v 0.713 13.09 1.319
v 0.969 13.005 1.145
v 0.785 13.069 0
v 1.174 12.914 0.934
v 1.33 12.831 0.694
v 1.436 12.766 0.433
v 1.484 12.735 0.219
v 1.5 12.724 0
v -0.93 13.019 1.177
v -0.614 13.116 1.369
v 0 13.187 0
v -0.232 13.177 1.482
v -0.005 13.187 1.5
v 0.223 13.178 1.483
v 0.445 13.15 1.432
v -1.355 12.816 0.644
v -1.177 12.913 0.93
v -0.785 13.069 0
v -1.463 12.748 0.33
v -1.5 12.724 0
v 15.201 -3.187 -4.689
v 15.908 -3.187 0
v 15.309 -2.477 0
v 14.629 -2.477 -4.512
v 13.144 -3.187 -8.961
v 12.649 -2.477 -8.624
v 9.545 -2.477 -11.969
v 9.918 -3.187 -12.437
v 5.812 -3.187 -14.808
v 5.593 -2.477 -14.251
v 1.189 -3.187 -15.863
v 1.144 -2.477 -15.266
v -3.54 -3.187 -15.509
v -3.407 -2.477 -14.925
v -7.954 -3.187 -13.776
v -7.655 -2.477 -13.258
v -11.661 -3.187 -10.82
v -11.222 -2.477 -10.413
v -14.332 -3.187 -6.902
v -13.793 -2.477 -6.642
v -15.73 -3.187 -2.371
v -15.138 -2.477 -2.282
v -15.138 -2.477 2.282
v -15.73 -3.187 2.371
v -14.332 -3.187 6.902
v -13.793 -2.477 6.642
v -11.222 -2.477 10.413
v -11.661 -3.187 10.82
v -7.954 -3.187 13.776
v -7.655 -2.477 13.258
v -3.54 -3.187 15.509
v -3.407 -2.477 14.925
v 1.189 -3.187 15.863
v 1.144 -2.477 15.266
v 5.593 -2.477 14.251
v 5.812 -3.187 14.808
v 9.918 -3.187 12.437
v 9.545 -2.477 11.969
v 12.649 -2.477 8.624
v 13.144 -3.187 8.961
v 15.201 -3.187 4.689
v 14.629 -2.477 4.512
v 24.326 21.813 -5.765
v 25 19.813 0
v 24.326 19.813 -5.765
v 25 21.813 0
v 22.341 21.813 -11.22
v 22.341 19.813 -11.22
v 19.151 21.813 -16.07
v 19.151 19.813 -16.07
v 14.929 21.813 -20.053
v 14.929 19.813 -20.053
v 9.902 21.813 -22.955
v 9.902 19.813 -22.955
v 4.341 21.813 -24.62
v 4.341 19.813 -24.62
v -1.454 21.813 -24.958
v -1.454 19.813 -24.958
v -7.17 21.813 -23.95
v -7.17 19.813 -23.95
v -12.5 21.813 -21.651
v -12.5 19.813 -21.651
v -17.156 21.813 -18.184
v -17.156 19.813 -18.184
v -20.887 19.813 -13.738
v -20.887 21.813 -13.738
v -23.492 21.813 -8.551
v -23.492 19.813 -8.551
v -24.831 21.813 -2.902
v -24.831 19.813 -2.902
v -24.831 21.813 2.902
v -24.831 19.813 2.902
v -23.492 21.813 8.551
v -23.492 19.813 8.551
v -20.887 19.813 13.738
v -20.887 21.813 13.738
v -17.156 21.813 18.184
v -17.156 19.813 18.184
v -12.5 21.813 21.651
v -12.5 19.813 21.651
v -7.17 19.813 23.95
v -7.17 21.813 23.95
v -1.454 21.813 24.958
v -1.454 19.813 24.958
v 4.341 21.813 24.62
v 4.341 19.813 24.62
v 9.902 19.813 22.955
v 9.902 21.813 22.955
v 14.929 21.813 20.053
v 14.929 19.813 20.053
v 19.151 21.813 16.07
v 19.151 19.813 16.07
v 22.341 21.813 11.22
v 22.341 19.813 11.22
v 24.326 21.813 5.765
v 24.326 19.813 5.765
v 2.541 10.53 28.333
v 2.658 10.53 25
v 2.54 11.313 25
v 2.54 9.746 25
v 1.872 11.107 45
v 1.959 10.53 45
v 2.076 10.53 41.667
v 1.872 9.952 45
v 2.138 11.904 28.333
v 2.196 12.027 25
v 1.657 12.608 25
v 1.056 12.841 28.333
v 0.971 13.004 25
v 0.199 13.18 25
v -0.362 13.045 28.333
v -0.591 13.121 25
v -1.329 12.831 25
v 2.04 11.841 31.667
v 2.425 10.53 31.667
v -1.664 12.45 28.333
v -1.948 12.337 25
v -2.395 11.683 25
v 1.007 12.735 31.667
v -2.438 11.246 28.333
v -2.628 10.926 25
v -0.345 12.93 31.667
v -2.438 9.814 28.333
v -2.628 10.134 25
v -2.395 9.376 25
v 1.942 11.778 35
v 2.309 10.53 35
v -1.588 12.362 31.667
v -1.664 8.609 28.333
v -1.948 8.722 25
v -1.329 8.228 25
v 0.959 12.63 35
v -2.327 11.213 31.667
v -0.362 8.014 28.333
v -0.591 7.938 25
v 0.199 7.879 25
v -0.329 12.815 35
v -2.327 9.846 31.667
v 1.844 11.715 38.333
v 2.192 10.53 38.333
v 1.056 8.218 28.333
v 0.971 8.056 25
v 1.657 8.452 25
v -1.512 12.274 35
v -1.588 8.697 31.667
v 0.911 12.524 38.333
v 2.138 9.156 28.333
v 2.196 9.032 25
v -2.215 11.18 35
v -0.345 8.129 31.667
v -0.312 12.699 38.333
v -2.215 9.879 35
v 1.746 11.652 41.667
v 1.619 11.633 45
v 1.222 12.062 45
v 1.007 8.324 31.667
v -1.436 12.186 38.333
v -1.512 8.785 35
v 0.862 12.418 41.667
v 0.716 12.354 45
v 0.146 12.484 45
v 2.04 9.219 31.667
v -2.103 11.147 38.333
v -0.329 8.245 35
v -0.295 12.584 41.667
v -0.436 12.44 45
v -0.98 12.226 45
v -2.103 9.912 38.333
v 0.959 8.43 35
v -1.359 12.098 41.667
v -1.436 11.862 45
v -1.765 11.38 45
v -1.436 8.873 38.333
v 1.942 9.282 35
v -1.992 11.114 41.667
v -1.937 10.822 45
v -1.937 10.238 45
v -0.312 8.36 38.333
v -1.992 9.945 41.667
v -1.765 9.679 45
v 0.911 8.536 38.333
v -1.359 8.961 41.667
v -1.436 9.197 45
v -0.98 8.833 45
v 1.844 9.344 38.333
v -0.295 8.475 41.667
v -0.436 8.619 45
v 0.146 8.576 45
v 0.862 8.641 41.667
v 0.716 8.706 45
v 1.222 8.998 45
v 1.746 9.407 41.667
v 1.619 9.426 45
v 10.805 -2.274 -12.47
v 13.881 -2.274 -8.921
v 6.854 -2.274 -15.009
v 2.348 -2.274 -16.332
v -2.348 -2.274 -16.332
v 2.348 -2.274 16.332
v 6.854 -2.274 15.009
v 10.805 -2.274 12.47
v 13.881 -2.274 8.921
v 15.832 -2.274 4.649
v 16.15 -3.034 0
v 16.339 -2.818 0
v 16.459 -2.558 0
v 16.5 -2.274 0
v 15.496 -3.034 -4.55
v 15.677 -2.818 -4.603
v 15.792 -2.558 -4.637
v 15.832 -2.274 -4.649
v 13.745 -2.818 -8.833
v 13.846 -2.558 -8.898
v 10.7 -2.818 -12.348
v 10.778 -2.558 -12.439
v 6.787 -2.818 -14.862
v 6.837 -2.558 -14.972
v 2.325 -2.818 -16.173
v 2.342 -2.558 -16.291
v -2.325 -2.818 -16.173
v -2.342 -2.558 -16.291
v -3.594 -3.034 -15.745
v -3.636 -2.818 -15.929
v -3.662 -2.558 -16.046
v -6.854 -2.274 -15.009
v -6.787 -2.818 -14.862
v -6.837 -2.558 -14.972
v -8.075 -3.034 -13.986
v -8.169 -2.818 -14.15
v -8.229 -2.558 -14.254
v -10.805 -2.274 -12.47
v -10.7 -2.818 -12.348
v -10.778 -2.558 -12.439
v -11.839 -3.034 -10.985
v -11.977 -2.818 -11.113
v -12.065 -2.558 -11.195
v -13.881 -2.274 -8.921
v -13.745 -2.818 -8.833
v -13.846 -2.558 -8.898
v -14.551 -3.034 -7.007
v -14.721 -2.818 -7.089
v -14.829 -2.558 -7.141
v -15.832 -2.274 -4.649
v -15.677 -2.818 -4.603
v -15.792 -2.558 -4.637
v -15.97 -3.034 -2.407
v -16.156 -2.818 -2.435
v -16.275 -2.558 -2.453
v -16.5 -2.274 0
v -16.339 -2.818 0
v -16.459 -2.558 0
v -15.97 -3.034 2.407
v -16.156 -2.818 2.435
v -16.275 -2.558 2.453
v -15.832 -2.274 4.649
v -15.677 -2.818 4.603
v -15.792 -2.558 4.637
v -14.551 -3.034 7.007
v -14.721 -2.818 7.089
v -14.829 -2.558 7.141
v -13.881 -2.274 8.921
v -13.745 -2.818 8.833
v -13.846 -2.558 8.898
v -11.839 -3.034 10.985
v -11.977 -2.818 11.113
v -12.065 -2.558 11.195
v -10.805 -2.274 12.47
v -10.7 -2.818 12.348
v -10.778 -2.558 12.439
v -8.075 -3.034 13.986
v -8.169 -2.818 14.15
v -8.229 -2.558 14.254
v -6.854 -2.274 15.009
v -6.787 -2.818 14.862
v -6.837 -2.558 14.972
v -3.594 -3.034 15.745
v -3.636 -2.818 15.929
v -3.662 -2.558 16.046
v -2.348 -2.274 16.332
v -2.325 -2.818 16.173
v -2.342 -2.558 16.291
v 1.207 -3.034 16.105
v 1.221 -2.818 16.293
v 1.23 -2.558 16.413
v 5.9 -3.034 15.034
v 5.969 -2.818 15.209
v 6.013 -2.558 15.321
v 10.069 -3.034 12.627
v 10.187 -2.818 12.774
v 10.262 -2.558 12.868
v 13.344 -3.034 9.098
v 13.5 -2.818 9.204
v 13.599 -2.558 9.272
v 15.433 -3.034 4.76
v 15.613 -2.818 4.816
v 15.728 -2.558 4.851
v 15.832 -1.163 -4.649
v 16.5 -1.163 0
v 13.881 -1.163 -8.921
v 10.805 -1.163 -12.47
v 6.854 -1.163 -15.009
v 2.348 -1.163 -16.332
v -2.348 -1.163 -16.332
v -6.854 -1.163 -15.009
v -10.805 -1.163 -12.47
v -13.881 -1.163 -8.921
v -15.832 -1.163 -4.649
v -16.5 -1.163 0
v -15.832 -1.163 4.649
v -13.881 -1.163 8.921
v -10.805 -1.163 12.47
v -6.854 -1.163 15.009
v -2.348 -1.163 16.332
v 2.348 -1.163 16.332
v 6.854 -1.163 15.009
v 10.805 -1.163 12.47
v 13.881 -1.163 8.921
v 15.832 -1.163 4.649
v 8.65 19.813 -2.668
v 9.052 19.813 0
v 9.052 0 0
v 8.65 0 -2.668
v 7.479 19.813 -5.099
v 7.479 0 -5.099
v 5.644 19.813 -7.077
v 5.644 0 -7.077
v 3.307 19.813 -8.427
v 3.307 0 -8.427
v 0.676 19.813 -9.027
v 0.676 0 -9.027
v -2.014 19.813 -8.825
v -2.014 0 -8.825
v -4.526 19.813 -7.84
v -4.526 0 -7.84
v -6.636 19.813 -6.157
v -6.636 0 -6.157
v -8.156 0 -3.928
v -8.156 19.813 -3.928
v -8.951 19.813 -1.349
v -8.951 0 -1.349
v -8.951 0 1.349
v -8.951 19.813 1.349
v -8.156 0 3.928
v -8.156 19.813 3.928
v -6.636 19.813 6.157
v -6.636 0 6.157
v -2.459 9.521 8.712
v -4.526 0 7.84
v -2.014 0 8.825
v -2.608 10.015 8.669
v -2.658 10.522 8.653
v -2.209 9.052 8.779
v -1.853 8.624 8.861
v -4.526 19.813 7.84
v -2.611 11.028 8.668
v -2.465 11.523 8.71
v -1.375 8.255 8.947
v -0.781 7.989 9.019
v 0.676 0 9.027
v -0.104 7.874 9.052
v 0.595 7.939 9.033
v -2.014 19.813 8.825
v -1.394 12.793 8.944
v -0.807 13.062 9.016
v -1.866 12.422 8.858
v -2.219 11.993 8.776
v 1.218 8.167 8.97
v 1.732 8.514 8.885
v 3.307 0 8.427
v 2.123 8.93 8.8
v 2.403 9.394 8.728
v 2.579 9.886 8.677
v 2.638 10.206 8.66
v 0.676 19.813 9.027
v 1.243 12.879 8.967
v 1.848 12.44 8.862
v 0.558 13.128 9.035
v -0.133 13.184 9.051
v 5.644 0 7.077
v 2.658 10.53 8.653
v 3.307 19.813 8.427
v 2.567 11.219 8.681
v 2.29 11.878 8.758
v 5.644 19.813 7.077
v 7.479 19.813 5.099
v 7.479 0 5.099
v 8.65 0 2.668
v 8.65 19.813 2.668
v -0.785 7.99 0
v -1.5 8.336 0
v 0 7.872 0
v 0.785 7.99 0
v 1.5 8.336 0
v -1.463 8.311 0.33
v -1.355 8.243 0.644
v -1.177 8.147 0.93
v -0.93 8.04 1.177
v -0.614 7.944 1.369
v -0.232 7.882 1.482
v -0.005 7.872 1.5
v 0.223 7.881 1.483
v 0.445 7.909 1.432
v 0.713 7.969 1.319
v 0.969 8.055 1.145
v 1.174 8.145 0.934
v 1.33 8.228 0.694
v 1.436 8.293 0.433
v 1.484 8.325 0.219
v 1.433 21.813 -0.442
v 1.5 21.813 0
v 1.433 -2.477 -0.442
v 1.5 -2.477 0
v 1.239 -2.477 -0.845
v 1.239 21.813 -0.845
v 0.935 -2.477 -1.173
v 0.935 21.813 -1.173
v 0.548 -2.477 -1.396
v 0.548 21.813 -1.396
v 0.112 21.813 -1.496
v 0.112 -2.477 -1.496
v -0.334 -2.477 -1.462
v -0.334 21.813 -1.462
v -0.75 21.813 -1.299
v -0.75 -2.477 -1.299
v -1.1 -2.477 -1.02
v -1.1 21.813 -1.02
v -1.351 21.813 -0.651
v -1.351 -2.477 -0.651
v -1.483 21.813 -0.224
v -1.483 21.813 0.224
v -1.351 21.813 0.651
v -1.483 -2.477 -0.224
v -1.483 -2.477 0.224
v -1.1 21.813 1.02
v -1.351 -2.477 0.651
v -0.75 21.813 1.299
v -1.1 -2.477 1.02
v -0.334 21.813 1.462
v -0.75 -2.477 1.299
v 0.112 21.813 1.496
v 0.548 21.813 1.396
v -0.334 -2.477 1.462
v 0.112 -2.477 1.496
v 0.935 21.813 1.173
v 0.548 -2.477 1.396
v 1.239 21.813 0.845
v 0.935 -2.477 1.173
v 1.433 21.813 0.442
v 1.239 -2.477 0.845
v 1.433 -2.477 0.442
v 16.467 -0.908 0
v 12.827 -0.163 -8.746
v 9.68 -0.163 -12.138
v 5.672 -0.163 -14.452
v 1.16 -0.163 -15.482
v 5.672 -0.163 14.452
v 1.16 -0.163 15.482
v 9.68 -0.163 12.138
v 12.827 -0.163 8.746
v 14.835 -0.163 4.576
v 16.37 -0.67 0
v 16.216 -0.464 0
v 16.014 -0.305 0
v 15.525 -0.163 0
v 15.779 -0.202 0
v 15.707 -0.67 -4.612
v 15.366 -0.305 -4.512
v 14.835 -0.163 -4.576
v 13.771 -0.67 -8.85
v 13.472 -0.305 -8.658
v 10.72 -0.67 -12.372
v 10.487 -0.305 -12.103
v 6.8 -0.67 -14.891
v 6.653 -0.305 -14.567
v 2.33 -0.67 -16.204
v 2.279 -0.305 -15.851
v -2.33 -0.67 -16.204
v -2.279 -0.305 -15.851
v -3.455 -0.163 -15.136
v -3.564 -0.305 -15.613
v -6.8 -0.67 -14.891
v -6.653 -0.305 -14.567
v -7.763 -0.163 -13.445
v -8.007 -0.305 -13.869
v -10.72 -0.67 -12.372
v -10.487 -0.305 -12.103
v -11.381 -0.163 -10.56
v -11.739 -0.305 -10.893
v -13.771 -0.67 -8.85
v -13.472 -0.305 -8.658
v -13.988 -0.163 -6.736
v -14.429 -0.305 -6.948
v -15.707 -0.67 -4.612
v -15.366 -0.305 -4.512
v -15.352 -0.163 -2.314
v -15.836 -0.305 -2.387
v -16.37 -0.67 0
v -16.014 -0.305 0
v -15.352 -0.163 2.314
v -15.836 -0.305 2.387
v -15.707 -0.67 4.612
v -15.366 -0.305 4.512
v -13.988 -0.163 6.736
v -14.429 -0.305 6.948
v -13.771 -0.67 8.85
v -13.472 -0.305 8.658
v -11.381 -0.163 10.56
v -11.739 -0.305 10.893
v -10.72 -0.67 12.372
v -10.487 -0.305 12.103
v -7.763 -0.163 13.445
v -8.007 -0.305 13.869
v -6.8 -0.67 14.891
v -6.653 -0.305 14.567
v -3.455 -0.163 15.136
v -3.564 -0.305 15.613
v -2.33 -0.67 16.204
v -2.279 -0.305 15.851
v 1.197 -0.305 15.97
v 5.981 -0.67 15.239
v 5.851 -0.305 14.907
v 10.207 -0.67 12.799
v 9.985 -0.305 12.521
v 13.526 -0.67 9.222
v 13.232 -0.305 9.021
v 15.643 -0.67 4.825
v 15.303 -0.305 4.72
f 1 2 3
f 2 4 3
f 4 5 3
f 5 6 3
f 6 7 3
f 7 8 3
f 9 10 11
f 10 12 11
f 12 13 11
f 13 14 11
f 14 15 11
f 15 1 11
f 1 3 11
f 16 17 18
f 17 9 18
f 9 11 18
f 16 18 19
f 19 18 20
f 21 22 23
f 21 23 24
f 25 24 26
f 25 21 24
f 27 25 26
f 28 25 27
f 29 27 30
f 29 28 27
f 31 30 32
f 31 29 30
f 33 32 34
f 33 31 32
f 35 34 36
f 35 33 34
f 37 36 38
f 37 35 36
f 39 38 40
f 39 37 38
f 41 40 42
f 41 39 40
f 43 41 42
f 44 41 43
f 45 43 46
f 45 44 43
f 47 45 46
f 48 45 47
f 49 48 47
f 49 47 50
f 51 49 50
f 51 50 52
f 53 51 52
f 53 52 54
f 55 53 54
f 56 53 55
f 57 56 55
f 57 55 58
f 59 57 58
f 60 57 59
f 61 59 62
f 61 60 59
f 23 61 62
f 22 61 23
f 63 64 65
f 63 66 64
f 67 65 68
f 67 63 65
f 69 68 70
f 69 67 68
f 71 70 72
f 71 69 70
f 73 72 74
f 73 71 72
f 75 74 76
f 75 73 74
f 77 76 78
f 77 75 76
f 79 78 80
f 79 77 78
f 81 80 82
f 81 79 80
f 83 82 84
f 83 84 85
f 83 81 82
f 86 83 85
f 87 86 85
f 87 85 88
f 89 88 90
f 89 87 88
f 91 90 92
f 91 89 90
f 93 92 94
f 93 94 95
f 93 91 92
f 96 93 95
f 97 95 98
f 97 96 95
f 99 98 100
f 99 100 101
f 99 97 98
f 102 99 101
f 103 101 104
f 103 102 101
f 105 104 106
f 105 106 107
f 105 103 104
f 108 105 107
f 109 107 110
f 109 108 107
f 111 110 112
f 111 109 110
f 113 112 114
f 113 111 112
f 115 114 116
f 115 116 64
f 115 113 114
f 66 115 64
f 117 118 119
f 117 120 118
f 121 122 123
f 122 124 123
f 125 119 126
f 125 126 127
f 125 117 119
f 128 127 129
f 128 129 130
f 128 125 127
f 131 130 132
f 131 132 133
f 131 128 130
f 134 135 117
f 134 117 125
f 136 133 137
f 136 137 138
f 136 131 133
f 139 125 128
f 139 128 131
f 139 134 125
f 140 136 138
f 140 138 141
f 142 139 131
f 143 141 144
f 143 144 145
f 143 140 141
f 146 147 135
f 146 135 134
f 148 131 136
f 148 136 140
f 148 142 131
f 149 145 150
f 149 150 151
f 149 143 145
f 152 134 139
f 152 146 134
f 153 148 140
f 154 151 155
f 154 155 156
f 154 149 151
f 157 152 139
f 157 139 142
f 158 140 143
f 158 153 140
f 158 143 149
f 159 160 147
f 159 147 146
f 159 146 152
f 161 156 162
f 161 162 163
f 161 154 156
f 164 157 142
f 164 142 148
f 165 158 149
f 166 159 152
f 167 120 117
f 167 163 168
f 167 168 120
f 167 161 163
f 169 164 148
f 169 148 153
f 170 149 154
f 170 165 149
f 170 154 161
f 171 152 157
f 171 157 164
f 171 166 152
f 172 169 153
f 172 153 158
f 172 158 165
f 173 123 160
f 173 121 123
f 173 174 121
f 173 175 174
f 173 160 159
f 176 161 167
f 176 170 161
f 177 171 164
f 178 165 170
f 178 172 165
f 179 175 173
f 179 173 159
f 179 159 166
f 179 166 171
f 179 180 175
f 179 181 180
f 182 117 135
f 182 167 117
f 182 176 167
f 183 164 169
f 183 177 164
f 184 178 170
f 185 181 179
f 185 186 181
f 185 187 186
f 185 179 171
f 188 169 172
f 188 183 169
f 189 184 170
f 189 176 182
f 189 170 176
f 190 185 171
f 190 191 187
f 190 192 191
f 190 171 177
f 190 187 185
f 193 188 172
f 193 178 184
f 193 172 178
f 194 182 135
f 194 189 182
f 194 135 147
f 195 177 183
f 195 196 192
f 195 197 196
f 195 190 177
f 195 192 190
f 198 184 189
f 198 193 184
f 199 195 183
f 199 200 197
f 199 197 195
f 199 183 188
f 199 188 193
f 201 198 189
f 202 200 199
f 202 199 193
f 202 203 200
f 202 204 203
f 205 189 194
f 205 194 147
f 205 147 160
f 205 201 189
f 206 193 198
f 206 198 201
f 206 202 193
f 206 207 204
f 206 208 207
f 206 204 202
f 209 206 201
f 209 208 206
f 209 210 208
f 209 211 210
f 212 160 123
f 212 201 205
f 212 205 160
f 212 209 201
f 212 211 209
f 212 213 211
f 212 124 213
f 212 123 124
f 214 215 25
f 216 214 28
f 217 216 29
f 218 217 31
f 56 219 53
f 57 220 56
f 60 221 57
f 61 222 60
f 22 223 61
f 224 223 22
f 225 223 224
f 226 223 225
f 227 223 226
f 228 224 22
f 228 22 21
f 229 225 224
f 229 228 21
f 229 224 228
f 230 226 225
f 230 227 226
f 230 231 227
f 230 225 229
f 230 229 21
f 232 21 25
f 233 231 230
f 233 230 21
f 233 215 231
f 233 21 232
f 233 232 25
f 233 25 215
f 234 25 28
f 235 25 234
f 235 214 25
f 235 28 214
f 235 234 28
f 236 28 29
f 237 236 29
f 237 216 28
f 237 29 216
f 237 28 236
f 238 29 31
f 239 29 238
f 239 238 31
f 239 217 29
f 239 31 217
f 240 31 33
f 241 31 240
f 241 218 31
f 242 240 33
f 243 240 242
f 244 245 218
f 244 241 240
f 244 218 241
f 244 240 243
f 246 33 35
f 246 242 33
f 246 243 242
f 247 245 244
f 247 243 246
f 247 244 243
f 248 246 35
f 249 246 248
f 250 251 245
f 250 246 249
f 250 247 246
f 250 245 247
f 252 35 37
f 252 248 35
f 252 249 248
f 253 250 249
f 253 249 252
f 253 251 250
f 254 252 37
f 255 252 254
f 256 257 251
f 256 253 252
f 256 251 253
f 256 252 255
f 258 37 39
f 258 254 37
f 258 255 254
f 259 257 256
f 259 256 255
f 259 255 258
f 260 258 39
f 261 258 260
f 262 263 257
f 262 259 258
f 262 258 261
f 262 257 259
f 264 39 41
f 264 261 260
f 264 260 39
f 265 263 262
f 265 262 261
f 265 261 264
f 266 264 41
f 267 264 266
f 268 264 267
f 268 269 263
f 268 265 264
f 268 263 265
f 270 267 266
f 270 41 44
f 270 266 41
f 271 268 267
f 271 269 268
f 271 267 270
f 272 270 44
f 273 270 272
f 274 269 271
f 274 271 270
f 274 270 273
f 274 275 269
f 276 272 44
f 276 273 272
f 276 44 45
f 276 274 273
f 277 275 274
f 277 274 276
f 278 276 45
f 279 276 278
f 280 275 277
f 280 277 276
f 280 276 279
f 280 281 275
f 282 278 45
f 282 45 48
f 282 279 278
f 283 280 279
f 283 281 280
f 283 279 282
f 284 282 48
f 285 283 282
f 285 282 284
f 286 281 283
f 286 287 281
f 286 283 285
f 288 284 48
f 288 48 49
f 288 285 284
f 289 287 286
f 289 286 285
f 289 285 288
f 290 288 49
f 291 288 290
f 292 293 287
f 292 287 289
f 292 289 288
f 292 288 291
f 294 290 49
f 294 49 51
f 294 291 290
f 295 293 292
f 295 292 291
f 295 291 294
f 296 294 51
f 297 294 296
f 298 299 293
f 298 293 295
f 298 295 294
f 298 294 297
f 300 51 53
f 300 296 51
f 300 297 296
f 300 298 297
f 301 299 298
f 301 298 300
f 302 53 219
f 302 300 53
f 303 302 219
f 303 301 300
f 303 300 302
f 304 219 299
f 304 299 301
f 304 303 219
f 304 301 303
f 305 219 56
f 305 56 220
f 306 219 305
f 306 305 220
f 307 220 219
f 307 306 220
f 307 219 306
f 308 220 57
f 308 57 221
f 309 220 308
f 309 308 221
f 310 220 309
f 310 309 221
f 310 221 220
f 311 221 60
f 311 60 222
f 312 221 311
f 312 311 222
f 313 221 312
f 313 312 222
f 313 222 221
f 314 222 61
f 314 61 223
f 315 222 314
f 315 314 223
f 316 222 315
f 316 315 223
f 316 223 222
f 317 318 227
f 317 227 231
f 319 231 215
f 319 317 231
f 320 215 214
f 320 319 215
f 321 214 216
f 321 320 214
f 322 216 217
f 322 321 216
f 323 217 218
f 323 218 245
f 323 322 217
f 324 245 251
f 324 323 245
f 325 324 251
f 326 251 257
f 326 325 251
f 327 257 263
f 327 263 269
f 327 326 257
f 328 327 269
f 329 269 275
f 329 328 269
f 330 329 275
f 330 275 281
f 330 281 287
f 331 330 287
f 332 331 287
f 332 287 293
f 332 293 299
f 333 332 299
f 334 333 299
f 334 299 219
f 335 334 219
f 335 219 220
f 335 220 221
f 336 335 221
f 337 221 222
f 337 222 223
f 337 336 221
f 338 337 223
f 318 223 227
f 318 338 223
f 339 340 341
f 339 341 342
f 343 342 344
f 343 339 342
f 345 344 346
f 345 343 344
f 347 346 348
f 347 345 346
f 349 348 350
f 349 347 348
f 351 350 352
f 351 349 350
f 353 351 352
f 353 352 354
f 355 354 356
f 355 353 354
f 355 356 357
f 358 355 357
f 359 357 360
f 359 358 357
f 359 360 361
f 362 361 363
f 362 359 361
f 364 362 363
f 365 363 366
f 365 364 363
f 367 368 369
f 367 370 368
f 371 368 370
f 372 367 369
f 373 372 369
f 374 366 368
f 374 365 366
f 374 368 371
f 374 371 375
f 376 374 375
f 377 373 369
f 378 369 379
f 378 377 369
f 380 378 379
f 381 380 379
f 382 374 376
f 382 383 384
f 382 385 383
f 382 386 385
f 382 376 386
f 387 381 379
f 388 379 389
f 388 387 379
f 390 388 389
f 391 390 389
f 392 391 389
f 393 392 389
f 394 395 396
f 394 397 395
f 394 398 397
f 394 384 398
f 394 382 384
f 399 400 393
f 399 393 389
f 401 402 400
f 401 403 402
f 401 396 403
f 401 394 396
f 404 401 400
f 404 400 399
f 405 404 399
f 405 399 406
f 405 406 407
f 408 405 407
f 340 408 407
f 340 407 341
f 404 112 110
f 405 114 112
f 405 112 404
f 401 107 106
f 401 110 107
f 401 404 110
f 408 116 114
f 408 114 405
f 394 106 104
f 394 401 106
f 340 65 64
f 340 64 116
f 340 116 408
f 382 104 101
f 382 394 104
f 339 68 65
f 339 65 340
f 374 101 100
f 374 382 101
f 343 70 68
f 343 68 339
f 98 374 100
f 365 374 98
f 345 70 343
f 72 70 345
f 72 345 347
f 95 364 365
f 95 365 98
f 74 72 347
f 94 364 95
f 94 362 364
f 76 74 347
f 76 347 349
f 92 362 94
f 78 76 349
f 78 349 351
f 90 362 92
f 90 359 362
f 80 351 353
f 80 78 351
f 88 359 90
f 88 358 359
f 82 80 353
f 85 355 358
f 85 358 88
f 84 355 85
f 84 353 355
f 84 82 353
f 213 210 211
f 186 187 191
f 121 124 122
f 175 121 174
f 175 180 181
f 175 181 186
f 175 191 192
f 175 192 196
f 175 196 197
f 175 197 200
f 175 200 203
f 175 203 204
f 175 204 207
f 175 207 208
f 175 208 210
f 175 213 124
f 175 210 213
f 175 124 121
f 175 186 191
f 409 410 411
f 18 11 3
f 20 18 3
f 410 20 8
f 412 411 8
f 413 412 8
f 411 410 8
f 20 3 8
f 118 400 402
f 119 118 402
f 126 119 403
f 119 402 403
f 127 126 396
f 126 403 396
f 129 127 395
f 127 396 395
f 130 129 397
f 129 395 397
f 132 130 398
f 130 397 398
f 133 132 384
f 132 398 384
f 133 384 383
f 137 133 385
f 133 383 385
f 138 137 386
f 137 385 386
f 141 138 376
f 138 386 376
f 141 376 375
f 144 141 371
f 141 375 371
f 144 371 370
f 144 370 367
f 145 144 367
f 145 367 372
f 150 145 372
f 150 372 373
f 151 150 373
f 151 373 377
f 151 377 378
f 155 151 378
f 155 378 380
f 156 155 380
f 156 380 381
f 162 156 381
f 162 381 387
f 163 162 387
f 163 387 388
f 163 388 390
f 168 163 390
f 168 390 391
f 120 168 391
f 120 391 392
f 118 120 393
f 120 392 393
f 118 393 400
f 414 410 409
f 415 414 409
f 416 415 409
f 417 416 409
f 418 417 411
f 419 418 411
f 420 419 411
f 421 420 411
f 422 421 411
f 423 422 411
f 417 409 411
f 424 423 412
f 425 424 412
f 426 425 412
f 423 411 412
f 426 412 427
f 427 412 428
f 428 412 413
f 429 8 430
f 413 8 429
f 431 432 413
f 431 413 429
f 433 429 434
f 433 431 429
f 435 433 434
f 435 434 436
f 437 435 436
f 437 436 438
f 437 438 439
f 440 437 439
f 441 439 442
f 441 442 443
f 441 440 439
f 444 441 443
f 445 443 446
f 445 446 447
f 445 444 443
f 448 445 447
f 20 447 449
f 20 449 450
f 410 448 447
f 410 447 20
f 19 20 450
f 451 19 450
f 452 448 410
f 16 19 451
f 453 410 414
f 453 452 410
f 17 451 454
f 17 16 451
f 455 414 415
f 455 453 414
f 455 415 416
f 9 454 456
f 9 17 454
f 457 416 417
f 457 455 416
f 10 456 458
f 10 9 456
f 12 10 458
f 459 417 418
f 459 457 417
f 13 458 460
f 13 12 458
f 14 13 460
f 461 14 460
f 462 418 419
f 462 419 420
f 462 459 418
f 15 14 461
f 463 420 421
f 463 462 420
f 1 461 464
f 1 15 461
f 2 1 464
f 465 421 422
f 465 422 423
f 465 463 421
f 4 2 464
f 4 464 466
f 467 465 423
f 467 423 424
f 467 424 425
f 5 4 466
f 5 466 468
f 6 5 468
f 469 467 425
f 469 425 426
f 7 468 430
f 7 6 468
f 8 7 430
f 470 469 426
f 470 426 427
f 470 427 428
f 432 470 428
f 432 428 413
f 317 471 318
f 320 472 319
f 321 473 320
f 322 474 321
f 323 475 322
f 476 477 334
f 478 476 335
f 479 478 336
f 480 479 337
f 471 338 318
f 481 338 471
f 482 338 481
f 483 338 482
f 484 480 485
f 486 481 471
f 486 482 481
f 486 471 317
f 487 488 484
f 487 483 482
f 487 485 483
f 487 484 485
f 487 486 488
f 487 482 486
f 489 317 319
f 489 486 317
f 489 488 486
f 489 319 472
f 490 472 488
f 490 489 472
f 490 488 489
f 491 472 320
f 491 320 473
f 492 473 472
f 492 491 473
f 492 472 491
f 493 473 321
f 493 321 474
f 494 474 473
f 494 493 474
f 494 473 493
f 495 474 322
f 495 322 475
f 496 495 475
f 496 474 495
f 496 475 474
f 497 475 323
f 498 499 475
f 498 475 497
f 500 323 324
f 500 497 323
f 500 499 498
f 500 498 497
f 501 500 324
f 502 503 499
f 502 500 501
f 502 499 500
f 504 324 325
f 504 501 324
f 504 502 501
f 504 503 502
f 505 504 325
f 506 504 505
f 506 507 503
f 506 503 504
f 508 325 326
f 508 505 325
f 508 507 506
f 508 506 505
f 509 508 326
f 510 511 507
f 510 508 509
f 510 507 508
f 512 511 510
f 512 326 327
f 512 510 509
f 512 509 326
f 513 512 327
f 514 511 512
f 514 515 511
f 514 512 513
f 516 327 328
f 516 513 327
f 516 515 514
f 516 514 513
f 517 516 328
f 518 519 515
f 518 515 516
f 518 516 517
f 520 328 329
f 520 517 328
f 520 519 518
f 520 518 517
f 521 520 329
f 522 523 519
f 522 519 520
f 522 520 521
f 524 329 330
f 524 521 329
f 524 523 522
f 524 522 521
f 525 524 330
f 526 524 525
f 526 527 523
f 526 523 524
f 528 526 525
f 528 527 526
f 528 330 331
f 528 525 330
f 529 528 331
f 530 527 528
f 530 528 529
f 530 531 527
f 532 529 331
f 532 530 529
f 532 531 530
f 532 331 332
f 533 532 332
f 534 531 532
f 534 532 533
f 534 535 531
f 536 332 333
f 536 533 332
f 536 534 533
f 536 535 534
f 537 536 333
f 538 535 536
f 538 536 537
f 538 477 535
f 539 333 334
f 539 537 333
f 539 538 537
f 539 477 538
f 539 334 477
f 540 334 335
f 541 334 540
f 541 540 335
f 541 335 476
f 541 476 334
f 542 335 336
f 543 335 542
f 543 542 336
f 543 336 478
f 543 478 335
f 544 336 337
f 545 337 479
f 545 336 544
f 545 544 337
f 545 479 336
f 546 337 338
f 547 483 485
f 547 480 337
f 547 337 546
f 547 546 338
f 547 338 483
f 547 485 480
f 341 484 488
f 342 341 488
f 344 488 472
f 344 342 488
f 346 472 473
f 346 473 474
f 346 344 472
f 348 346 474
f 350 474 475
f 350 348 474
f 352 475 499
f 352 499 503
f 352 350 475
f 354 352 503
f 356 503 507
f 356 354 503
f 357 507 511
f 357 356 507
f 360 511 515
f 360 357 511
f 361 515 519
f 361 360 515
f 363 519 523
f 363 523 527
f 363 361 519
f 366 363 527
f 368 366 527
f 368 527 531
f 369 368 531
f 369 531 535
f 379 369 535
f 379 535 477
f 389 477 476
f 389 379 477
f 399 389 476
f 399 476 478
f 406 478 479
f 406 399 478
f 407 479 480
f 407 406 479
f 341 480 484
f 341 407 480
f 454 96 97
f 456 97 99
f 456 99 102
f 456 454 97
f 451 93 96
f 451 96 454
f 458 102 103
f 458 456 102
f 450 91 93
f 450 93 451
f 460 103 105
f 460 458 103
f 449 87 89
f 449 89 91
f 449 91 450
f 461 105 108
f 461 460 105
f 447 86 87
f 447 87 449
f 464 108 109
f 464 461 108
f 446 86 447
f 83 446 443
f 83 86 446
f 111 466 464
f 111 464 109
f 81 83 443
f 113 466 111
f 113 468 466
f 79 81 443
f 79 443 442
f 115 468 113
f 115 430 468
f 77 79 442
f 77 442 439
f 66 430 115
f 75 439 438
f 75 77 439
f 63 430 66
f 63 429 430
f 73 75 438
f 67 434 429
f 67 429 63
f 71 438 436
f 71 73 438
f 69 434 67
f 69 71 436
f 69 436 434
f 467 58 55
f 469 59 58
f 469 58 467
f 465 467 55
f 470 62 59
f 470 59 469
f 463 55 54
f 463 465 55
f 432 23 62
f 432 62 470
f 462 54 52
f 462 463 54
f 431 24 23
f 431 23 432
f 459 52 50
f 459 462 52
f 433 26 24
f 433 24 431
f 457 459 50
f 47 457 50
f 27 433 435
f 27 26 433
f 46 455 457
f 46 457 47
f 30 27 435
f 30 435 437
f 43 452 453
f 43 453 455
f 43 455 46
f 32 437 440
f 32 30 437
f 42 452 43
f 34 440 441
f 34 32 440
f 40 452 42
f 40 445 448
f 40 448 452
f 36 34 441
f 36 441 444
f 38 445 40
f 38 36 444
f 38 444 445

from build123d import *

# Parameters (mm, degrees)
F3_R     = 2.6577794355
F4_DEPTH = 45
F5_SIZE2 = 0.6984153898
F5_SIZE  = 20


# Not quite as in the source:
# - a fillet or chamfer that OpenCascade refuses, or shapes differently, is made with other operations: its cross-section is extruded or revolved along the edge and cut away or added


with BuildPart() as f1:
    # F0 (on Top) → F1 (revolve)
    with BuildSketch(Plane.XY):
        Polygon((25, 21.8126288628), (1.5, 21.8126288628), (1.5, -2.4768179283), (15.309067443, -2.4768179283), (15.9076526761, -3.1873711372), (16.5, -3.1873711372), (16.5, -0.1873711372), (9.0524229015, 0), (9.0524229015, 19.8126288628), (25, 19.8126288628), align=None)
    revolve(axis=Axis((0, 9.3126288628, 0), (0, 1, 0)))

    # F2: fillet of radius 1 on 2 edges, made by hand

    # F2_s1 → F2_t2 (revolve, cut)
    with BuildSketch(Plane.XY):
        with BuildLine():
            ThreePointArc((15.9076526761, -3.1873711372), (16.3389435845, -2.8184524698), (16.5, -2.2742340743))
            Line((16.5, -2.2742340743), (16.5, -3.1873711372))
            Line((16.5, -3.1873711372), (15.9076526761, -3.1873711372))
        make_face()
    revolve(axis=Axis((0, -3.1873711372, 0), (0, 1, 0)), mode=Mode.SUBTRACT)

    # F2_s3 → F2_t4 (revolve, cut)
    with BuildSketch(Plane.XY):
        with BuildLine():
            ThreePointArc((16.5, -1.1625288961), (16.2159436821, -0.4643708596), (15.5251507119, -0.1628452253))
            Line((15.5251507119, -0.1628452253), (16.5, -0.1873711372))
            Line((16.5, -0.1873711372), (16.5, -1.1625288961))
        make_face()
    revolve(axis=Axis((0, -0.1873711372, 0), (0, 1, 0)), mode=Mode.SUBTRACT)

    # F3 (on Top) → F4 (join)
    with BuildSketch(Plane.XY):
        with Locations((0, 10.5296224356)):
            Circle(F3_R)
    extrude(amount=F4_DEPTH)

    # F5
    f5_edges = [f1.edges().sort_by_distance(p)[0] for p in [
        (-2.657779, 10.529622, 45),
    ]]
    f5_side = f1.faces().sort_by_distance((-2.657779, 10.529622, 26.826736))[0]
    chamfer(f5_edges, length=F5_SIZE, length2=F5_SIZE2, reference=f5_side)


solid = f1.part
